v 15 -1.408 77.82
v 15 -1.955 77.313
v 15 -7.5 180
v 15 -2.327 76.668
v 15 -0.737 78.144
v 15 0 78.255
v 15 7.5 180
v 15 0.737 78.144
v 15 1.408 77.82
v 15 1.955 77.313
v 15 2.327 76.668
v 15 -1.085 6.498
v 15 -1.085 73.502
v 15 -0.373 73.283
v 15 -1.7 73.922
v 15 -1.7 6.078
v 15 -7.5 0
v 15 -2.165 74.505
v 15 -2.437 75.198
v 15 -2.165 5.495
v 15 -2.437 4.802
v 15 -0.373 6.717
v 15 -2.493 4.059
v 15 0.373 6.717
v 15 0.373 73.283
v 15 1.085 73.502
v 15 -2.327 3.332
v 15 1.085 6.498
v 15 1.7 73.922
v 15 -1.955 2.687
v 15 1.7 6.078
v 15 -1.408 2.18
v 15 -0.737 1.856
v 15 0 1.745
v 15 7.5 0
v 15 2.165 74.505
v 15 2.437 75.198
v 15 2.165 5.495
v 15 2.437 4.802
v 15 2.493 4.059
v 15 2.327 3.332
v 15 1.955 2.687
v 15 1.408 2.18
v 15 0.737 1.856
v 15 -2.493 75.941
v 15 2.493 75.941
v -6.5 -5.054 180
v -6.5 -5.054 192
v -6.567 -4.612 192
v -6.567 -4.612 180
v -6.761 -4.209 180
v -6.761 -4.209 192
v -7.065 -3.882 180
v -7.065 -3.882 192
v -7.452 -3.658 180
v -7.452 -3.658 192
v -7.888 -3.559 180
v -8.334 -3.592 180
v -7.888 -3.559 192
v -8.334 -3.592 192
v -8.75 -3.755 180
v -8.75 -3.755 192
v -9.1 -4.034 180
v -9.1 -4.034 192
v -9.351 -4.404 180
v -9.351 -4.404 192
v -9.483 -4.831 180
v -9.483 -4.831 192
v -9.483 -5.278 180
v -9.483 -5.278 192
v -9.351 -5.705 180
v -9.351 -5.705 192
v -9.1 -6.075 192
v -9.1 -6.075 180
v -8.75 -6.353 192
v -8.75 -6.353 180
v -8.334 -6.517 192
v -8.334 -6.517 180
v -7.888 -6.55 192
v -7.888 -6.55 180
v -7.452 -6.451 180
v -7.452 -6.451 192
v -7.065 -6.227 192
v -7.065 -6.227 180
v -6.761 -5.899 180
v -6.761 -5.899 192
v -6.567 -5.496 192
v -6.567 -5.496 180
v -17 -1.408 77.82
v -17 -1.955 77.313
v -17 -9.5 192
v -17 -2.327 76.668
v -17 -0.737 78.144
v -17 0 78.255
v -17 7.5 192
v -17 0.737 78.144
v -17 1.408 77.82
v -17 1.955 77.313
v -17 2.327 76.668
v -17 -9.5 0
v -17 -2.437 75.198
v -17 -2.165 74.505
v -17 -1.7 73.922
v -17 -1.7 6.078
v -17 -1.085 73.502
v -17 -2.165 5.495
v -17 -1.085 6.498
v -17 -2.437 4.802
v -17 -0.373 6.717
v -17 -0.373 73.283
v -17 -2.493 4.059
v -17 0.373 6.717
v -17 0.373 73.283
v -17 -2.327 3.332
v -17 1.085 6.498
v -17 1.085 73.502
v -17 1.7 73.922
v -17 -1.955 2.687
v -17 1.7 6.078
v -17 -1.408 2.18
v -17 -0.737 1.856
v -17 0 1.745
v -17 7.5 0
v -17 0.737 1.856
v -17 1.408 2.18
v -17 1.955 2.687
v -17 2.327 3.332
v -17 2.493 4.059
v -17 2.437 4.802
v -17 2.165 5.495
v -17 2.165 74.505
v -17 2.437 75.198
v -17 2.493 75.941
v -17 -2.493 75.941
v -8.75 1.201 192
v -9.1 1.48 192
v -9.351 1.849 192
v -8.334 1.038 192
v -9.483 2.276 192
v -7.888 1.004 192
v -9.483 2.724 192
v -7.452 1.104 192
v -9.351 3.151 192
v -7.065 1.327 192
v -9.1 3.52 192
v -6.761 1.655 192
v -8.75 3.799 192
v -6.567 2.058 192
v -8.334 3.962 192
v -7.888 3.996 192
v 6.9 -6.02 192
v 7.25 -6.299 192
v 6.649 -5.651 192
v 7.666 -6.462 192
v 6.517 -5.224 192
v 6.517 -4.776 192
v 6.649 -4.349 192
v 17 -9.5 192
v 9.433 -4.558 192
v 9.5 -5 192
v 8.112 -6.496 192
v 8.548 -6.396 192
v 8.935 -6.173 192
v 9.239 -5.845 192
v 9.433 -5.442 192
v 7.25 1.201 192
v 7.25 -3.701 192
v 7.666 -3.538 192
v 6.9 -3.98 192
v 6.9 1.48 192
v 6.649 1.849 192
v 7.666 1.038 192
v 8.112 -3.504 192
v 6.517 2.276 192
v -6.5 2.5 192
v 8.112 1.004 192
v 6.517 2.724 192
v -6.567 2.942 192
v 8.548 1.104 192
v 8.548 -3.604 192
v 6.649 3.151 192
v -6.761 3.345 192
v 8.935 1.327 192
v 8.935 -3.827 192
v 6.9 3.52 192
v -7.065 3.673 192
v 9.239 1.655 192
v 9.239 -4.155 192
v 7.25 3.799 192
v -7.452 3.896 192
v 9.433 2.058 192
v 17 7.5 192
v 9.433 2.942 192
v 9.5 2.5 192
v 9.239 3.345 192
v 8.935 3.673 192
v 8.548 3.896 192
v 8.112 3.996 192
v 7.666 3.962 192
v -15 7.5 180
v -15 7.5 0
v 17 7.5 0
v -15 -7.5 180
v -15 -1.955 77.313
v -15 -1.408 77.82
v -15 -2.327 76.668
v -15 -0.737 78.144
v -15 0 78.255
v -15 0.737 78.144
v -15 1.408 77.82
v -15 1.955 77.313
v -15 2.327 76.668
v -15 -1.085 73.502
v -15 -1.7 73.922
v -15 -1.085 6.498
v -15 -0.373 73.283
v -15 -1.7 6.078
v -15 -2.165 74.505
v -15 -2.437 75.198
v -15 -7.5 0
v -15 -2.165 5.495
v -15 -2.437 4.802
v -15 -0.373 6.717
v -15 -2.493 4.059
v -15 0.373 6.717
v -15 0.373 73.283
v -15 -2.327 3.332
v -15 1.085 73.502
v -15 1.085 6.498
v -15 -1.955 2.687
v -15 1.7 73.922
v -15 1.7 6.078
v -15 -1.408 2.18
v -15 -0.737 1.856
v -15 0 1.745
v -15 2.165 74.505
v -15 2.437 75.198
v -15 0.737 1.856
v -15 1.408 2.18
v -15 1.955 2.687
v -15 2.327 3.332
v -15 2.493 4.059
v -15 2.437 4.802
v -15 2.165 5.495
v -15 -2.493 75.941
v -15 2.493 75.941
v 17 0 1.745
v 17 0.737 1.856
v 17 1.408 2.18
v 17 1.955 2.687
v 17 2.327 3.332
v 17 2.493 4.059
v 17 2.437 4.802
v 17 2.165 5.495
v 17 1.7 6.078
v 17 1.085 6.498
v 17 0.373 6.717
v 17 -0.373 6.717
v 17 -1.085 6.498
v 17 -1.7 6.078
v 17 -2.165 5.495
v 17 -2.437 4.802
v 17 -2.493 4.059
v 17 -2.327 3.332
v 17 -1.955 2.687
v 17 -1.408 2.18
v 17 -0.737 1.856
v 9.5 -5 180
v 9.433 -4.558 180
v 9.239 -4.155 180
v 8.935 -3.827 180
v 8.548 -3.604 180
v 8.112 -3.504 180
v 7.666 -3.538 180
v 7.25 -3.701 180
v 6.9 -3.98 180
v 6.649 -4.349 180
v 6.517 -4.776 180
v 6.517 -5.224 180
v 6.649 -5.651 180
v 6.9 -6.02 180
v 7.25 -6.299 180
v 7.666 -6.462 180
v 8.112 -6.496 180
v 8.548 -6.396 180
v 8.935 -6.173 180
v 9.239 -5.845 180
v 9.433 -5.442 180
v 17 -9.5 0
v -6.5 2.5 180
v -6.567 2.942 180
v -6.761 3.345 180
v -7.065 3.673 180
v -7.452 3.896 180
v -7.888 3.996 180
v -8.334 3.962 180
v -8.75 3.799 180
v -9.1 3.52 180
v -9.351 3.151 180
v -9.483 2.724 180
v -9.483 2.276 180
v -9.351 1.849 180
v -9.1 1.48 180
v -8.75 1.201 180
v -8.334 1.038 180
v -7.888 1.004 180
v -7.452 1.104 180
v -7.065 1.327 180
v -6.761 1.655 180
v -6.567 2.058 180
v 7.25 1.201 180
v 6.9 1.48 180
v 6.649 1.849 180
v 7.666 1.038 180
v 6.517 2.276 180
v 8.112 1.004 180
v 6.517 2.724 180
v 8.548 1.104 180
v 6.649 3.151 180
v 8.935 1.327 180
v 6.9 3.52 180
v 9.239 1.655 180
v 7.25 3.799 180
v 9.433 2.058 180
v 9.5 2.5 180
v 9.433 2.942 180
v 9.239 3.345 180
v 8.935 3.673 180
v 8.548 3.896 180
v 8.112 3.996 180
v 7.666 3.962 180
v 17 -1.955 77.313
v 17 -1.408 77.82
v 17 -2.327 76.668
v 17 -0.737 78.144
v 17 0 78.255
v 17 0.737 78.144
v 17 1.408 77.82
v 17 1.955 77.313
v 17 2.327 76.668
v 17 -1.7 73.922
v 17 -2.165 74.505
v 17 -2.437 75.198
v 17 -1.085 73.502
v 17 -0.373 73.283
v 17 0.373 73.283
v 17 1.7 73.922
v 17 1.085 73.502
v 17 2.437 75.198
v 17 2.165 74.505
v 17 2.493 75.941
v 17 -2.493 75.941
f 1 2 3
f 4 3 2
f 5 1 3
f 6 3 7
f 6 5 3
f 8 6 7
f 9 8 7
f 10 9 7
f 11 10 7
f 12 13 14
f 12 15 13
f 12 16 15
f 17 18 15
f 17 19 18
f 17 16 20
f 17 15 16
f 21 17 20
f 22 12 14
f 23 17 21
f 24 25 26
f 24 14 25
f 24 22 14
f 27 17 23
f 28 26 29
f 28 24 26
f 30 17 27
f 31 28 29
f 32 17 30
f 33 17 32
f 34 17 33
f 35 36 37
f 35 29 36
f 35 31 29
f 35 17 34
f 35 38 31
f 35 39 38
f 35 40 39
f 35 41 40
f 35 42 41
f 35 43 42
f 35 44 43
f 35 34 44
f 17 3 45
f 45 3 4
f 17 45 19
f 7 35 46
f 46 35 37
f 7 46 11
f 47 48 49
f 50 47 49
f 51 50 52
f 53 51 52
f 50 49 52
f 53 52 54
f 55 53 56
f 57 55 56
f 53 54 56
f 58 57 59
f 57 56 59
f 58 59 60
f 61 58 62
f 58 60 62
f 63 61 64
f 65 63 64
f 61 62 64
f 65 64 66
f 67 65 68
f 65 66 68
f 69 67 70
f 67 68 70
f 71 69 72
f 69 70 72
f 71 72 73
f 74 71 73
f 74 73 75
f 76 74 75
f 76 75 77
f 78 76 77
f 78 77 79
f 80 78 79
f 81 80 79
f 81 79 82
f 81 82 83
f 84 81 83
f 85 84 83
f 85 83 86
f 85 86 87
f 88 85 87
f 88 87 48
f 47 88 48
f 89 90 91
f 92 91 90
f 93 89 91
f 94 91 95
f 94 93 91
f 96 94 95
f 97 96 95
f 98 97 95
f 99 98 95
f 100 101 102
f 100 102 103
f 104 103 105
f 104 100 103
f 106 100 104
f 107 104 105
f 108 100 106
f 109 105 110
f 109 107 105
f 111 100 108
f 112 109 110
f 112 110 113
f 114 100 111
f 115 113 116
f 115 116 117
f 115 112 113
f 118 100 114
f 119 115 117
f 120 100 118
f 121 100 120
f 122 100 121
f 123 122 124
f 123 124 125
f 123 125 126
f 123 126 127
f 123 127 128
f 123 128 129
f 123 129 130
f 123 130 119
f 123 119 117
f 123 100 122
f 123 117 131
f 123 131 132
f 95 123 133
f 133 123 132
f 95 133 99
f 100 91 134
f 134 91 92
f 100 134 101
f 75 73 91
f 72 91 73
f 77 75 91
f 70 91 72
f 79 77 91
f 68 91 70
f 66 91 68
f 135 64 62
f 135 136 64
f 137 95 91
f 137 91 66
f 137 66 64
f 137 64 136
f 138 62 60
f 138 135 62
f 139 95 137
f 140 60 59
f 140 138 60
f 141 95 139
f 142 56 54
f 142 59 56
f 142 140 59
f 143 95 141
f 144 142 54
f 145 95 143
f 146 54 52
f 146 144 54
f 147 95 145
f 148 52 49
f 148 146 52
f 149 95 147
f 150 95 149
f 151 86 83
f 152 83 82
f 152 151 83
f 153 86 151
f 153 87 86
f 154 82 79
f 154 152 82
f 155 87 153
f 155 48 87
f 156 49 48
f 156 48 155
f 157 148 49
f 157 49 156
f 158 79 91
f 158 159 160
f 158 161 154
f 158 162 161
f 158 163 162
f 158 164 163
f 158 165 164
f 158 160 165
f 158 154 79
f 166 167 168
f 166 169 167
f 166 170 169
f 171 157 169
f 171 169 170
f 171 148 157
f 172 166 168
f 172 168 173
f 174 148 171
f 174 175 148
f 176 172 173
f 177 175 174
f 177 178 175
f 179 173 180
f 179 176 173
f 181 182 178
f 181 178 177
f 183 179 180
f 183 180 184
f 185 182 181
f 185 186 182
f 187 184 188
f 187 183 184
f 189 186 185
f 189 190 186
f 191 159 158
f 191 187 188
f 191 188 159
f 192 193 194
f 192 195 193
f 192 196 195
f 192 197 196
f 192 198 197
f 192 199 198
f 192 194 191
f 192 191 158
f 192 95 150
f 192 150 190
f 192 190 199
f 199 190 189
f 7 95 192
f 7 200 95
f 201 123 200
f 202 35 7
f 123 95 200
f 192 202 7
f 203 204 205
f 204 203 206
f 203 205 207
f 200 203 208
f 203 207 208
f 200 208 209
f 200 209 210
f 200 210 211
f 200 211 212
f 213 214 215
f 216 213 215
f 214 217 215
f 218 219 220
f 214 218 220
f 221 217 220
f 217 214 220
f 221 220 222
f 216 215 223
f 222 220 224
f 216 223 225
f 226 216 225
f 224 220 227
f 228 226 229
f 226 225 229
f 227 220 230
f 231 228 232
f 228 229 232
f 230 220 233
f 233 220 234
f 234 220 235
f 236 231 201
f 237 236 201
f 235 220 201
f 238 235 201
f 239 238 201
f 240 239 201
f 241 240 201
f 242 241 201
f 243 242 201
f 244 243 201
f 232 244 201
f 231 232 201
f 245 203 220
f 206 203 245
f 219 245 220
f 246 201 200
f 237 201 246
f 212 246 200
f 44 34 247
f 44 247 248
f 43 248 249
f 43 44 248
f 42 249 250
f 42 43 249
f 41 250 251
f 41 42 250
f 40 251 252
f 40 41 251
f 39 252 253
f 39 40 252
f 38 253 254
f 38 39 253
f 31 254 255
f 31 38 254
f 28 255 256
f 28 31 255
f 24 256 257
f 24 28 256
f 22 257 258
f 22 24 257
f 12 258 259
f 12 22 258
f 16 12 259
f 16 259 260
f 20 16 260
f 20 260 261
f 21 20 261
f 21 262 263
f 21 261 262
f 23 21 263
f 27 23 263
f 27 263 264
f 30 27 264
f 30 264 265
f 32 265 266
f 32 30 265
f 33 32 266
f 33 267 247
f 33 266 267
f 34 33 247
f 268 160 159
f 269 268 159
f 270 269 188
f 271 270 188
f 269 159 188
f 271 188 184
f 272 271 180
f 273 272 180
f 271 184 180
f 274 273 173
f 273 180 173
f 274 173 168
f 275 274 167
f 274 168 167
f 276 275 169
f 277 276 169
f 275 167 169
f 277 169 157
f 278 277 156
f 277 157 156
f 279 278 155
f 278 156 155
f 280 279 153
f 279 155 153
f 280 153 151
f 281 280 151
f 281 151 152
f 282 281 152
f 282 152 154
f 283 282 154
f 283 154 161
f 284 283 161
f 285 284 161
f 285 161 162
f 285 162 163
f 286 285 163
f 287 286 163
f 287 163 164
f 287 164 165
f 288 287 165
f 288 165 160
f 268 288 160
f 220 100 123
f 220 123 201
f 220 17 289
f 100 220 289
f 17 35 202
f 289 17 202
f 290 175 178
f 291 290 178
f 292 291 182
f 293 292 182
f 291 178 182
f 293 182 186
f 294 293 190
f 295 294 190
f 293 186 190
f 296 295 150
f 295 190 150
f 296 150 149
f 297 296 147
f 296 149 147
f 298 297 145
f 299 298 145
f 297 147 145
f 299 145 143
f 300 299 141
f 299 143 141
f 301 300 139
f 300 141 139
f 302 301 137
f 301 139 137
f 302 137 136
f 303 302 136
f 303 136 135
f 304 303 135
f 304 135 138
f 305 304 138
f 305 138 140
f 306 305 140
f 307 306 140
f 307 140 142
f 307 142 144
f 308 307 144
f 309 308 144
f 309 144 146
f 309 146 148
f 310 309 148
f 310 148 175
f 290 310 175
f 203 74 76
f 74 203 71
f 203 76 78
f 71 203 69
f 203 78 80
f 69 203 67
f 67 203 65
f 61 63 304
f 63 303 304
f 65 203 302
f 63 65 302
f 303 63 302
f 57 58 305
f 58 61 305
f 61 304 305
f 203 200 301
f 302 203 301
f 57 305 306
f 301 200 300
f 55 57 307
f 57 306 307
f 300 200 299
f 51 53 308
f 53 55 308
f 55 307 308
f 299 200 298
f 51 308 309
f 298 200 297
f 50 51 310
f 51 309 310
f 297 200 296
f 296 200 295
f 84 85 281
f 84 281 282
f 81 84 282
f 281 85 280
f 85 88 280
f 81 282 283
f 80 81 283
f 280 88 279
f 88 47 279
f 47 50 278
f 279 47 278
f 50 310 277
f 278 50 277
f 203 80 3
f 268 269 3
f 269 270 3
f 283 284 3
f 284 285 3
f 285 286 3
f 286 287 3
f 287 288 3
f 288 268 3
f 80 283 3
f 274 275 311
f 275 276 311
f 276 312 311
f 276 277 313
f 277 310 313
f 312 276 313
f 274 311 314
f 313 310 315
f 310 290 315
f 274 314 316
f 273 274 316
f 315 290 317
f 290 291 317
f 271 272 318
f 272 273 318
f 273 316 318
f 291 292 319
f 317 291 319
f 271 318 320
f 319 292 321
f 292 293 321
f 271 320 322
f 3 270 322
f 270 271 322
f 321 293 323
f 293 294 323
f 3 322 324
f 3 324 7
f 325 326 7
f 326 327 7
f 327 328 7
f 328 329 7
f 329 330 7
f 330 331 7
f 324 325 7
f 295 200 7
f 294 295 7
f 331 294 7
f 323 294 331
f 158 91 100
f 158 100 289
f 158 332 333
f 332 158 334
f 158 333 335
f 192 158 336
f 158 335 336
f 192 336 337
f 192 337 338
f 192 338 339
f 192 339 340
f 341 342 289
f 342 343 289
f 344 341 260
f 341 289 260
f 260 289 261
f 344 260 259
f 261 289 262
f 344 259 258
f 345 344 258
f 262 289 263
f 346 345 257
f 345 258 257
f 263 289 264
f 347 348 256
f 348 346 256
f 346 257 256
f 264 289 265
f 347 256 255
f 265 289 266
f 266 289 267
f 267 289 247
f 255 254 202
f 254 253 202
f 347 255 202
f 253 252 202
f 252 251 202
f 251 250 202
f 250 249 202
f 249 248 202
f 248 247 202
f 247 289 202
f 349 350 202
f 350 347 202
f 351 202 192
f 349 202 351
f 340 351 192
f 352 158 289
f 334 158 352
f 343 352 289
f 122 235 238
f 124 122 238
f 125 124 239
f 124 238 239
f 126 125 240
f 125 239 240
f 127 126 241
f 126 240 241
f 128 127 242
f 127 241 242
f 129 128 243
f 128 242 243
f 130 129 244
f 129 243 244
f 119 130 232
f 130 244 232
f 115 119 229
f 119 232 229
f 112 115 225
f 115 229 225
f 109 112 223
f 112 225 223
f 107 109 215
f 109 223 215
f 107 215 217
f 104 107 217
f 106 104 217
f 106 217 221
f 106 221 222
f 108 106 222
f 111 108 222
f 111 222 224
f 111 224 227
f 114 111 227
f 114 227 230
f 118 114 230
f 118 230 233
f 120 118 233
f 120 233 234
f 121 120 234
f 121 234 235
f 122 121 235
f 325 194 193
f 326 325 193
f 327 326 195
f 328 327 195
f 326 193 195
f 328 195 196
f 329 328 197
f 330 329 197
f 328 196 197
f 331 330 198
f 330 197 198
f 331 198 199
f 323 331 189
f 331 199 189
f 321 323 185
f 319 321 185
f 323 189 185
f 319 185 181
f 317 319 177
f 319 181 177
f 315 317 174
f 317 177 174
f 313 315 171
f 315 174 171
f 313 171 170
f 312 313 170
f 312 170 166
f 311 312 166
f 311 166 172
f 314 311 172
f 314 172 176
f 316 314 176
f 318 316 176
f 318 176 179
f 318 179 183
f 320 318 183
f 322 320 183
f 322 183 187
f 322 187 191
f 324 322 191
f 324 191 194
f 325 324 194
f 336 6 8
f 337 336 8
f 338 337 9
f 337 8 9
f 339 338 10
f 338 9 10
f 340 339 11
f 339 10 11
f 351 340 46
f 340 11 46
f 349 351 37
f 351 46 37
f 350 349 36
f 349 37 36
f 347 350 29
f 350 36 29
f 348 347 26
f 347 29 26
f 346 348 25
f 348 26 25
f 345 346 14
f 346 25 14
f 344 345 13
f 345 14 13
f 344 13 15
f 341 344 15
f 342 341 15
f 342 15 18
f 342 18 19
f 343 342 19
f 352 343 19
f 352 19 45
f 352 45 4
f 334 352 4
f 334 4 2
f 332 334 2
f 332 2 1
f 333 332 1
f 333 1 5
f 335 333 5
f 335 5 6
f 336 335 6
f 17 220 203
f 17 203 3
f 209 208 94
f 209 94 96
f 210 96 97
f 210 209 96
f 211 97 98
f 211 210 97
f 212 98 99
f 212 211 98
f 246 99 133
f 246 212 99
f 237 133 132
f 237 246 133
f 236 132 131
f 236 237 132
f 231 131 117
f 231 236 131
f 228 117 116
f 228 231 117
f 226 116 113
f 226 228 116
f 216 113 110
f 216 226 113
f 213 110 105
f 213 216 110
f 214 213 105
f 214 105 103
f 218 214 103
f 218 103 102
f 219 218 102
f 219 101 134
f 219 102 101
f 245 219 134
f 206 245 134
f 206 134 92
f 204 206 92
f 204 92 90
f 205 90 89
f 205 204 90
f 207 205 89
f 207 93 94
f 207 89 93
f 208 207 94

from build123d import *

# Parameters (mm, degrees)
SKETCH1_W               = 30
SKETCH1_H               = 15
BOSS_EXTRUDE1_DEPTH     = 180
SHELL2_T                = 2
SKETCH3_R               = 2.5
CUT_EXTRUDE3_DEPTH      = 50
MIRROR3_COPY_1_SKETCH_R = 2.5
MIRROR3_COPY_1_DEPTH    = 50
SKETCH7_W               = 34
SKETCH7_H               = 17
BOSS_EXTRUDE5_DEPTH     = 10
SKETCH12_R              = 1.5
CUT_EXTRUDE5_DEPTH      = 193.985103052
SKETCH13_R              = 1.5
CUT_EXTRUDE6_DEPTH      = 193.985103052


with BuildPart() as part:
    # Sketch1 → Boss-Extrude1 (new body)
    with BuildSketch(Plane.XY):
        Rectangle(SKETCH1_W, SKETCH1_H)
    extrude(amount=BOSS_EXTRUDE1_DEPTH)

    # Shell2
    shell2_openings = [part.faces().sort_by_distance(p)[0] for p in [
        (0, 7.5, 90),
        (0, 0, 0),
    ]]
    offset(amount=SHELL2_T, openings=shell2_openings, kind=Kind.INTERSECTION)

    # Sketch3 → Cut-Extrude3 (cut)
    with BuildSketch(Plane(origin=(15, 0, 0), x_dir=(0, 0, -1), z_dir=(1, 0, 0))):
        with Locations((-4.245349373, 0)):
            Circle(SKETCH3_R)
    cut_extrude3 = extrude(amount=-CUT_EXTRUDE3_DEPTH, mode=Mode.SUBTRACT)

    # Mirror1: Cut-Extrude3 across plane
    add(cut_extrude3.mirror(Plane.XY.offset(40)), mode=Mode.SUBTRACT)

    # Mirror3: Cut-Extrude3 across plane
    add(cut_extrude3.mirror(Plane(origin=(0, 0, 0), x_dir=(0, 0, 1), z_dir=(1, 0, 0))), mode=Mode.SUBTRACT)

    # Mirror3 copy 1 sketch → Mirror3 copy 1 (cut)
    with BuildSketch(Plane(origin=(-15, 0, 80), x_dir=(0, 0, 1), z_dir=(-1, 0, 0))):
        with Locations((-4.245349373, 0)):
            Circle(MIRROR3_COPY_1_SKETCH_R)
    extrude(amount=-MIRROR3_COPY_1_DEPTH, mode=Mode.SUBTRACT)

    # Sketch7 → Boss-Extrude5 (add)
    with BuildSketch(Plane.XY.offset(182)):
        with Locations((0, -1)):
            Rectangle(SKETCH7_W, SKETCH7_H)
    extrude(amount=BOSS_EXTRUDE5_DEPTH)

    # Sketch12 → Cut-Extrude5 (cut, through all)
    with BuildSketch(Plane.XY.offset(192)):
        with Locations((-8, 2.5)):
            Circle(SKETCH12_R)
        with Locations((-8, -5.054330526)):
            Circle(SKETCH12_R)
        with Locations((8, 2.5)):
            Circle(SKETCH12_R)
    extrude(amount=-CUT_EXTRUDE5_DEPTH, mode=Mode.SUBTRACT)

    # Sketch13 → Cut-Extrude6 (cut, through all)
    with BuildSketch(Plane.XY.offset(192)):
        with Locations((8, -5)):
            Circle(SKETCH13_R)
    extrude(amount=-CUT_EXTRUDE6_DEPTH, mode=Mode.SUBTRACT)


solid = part.part
